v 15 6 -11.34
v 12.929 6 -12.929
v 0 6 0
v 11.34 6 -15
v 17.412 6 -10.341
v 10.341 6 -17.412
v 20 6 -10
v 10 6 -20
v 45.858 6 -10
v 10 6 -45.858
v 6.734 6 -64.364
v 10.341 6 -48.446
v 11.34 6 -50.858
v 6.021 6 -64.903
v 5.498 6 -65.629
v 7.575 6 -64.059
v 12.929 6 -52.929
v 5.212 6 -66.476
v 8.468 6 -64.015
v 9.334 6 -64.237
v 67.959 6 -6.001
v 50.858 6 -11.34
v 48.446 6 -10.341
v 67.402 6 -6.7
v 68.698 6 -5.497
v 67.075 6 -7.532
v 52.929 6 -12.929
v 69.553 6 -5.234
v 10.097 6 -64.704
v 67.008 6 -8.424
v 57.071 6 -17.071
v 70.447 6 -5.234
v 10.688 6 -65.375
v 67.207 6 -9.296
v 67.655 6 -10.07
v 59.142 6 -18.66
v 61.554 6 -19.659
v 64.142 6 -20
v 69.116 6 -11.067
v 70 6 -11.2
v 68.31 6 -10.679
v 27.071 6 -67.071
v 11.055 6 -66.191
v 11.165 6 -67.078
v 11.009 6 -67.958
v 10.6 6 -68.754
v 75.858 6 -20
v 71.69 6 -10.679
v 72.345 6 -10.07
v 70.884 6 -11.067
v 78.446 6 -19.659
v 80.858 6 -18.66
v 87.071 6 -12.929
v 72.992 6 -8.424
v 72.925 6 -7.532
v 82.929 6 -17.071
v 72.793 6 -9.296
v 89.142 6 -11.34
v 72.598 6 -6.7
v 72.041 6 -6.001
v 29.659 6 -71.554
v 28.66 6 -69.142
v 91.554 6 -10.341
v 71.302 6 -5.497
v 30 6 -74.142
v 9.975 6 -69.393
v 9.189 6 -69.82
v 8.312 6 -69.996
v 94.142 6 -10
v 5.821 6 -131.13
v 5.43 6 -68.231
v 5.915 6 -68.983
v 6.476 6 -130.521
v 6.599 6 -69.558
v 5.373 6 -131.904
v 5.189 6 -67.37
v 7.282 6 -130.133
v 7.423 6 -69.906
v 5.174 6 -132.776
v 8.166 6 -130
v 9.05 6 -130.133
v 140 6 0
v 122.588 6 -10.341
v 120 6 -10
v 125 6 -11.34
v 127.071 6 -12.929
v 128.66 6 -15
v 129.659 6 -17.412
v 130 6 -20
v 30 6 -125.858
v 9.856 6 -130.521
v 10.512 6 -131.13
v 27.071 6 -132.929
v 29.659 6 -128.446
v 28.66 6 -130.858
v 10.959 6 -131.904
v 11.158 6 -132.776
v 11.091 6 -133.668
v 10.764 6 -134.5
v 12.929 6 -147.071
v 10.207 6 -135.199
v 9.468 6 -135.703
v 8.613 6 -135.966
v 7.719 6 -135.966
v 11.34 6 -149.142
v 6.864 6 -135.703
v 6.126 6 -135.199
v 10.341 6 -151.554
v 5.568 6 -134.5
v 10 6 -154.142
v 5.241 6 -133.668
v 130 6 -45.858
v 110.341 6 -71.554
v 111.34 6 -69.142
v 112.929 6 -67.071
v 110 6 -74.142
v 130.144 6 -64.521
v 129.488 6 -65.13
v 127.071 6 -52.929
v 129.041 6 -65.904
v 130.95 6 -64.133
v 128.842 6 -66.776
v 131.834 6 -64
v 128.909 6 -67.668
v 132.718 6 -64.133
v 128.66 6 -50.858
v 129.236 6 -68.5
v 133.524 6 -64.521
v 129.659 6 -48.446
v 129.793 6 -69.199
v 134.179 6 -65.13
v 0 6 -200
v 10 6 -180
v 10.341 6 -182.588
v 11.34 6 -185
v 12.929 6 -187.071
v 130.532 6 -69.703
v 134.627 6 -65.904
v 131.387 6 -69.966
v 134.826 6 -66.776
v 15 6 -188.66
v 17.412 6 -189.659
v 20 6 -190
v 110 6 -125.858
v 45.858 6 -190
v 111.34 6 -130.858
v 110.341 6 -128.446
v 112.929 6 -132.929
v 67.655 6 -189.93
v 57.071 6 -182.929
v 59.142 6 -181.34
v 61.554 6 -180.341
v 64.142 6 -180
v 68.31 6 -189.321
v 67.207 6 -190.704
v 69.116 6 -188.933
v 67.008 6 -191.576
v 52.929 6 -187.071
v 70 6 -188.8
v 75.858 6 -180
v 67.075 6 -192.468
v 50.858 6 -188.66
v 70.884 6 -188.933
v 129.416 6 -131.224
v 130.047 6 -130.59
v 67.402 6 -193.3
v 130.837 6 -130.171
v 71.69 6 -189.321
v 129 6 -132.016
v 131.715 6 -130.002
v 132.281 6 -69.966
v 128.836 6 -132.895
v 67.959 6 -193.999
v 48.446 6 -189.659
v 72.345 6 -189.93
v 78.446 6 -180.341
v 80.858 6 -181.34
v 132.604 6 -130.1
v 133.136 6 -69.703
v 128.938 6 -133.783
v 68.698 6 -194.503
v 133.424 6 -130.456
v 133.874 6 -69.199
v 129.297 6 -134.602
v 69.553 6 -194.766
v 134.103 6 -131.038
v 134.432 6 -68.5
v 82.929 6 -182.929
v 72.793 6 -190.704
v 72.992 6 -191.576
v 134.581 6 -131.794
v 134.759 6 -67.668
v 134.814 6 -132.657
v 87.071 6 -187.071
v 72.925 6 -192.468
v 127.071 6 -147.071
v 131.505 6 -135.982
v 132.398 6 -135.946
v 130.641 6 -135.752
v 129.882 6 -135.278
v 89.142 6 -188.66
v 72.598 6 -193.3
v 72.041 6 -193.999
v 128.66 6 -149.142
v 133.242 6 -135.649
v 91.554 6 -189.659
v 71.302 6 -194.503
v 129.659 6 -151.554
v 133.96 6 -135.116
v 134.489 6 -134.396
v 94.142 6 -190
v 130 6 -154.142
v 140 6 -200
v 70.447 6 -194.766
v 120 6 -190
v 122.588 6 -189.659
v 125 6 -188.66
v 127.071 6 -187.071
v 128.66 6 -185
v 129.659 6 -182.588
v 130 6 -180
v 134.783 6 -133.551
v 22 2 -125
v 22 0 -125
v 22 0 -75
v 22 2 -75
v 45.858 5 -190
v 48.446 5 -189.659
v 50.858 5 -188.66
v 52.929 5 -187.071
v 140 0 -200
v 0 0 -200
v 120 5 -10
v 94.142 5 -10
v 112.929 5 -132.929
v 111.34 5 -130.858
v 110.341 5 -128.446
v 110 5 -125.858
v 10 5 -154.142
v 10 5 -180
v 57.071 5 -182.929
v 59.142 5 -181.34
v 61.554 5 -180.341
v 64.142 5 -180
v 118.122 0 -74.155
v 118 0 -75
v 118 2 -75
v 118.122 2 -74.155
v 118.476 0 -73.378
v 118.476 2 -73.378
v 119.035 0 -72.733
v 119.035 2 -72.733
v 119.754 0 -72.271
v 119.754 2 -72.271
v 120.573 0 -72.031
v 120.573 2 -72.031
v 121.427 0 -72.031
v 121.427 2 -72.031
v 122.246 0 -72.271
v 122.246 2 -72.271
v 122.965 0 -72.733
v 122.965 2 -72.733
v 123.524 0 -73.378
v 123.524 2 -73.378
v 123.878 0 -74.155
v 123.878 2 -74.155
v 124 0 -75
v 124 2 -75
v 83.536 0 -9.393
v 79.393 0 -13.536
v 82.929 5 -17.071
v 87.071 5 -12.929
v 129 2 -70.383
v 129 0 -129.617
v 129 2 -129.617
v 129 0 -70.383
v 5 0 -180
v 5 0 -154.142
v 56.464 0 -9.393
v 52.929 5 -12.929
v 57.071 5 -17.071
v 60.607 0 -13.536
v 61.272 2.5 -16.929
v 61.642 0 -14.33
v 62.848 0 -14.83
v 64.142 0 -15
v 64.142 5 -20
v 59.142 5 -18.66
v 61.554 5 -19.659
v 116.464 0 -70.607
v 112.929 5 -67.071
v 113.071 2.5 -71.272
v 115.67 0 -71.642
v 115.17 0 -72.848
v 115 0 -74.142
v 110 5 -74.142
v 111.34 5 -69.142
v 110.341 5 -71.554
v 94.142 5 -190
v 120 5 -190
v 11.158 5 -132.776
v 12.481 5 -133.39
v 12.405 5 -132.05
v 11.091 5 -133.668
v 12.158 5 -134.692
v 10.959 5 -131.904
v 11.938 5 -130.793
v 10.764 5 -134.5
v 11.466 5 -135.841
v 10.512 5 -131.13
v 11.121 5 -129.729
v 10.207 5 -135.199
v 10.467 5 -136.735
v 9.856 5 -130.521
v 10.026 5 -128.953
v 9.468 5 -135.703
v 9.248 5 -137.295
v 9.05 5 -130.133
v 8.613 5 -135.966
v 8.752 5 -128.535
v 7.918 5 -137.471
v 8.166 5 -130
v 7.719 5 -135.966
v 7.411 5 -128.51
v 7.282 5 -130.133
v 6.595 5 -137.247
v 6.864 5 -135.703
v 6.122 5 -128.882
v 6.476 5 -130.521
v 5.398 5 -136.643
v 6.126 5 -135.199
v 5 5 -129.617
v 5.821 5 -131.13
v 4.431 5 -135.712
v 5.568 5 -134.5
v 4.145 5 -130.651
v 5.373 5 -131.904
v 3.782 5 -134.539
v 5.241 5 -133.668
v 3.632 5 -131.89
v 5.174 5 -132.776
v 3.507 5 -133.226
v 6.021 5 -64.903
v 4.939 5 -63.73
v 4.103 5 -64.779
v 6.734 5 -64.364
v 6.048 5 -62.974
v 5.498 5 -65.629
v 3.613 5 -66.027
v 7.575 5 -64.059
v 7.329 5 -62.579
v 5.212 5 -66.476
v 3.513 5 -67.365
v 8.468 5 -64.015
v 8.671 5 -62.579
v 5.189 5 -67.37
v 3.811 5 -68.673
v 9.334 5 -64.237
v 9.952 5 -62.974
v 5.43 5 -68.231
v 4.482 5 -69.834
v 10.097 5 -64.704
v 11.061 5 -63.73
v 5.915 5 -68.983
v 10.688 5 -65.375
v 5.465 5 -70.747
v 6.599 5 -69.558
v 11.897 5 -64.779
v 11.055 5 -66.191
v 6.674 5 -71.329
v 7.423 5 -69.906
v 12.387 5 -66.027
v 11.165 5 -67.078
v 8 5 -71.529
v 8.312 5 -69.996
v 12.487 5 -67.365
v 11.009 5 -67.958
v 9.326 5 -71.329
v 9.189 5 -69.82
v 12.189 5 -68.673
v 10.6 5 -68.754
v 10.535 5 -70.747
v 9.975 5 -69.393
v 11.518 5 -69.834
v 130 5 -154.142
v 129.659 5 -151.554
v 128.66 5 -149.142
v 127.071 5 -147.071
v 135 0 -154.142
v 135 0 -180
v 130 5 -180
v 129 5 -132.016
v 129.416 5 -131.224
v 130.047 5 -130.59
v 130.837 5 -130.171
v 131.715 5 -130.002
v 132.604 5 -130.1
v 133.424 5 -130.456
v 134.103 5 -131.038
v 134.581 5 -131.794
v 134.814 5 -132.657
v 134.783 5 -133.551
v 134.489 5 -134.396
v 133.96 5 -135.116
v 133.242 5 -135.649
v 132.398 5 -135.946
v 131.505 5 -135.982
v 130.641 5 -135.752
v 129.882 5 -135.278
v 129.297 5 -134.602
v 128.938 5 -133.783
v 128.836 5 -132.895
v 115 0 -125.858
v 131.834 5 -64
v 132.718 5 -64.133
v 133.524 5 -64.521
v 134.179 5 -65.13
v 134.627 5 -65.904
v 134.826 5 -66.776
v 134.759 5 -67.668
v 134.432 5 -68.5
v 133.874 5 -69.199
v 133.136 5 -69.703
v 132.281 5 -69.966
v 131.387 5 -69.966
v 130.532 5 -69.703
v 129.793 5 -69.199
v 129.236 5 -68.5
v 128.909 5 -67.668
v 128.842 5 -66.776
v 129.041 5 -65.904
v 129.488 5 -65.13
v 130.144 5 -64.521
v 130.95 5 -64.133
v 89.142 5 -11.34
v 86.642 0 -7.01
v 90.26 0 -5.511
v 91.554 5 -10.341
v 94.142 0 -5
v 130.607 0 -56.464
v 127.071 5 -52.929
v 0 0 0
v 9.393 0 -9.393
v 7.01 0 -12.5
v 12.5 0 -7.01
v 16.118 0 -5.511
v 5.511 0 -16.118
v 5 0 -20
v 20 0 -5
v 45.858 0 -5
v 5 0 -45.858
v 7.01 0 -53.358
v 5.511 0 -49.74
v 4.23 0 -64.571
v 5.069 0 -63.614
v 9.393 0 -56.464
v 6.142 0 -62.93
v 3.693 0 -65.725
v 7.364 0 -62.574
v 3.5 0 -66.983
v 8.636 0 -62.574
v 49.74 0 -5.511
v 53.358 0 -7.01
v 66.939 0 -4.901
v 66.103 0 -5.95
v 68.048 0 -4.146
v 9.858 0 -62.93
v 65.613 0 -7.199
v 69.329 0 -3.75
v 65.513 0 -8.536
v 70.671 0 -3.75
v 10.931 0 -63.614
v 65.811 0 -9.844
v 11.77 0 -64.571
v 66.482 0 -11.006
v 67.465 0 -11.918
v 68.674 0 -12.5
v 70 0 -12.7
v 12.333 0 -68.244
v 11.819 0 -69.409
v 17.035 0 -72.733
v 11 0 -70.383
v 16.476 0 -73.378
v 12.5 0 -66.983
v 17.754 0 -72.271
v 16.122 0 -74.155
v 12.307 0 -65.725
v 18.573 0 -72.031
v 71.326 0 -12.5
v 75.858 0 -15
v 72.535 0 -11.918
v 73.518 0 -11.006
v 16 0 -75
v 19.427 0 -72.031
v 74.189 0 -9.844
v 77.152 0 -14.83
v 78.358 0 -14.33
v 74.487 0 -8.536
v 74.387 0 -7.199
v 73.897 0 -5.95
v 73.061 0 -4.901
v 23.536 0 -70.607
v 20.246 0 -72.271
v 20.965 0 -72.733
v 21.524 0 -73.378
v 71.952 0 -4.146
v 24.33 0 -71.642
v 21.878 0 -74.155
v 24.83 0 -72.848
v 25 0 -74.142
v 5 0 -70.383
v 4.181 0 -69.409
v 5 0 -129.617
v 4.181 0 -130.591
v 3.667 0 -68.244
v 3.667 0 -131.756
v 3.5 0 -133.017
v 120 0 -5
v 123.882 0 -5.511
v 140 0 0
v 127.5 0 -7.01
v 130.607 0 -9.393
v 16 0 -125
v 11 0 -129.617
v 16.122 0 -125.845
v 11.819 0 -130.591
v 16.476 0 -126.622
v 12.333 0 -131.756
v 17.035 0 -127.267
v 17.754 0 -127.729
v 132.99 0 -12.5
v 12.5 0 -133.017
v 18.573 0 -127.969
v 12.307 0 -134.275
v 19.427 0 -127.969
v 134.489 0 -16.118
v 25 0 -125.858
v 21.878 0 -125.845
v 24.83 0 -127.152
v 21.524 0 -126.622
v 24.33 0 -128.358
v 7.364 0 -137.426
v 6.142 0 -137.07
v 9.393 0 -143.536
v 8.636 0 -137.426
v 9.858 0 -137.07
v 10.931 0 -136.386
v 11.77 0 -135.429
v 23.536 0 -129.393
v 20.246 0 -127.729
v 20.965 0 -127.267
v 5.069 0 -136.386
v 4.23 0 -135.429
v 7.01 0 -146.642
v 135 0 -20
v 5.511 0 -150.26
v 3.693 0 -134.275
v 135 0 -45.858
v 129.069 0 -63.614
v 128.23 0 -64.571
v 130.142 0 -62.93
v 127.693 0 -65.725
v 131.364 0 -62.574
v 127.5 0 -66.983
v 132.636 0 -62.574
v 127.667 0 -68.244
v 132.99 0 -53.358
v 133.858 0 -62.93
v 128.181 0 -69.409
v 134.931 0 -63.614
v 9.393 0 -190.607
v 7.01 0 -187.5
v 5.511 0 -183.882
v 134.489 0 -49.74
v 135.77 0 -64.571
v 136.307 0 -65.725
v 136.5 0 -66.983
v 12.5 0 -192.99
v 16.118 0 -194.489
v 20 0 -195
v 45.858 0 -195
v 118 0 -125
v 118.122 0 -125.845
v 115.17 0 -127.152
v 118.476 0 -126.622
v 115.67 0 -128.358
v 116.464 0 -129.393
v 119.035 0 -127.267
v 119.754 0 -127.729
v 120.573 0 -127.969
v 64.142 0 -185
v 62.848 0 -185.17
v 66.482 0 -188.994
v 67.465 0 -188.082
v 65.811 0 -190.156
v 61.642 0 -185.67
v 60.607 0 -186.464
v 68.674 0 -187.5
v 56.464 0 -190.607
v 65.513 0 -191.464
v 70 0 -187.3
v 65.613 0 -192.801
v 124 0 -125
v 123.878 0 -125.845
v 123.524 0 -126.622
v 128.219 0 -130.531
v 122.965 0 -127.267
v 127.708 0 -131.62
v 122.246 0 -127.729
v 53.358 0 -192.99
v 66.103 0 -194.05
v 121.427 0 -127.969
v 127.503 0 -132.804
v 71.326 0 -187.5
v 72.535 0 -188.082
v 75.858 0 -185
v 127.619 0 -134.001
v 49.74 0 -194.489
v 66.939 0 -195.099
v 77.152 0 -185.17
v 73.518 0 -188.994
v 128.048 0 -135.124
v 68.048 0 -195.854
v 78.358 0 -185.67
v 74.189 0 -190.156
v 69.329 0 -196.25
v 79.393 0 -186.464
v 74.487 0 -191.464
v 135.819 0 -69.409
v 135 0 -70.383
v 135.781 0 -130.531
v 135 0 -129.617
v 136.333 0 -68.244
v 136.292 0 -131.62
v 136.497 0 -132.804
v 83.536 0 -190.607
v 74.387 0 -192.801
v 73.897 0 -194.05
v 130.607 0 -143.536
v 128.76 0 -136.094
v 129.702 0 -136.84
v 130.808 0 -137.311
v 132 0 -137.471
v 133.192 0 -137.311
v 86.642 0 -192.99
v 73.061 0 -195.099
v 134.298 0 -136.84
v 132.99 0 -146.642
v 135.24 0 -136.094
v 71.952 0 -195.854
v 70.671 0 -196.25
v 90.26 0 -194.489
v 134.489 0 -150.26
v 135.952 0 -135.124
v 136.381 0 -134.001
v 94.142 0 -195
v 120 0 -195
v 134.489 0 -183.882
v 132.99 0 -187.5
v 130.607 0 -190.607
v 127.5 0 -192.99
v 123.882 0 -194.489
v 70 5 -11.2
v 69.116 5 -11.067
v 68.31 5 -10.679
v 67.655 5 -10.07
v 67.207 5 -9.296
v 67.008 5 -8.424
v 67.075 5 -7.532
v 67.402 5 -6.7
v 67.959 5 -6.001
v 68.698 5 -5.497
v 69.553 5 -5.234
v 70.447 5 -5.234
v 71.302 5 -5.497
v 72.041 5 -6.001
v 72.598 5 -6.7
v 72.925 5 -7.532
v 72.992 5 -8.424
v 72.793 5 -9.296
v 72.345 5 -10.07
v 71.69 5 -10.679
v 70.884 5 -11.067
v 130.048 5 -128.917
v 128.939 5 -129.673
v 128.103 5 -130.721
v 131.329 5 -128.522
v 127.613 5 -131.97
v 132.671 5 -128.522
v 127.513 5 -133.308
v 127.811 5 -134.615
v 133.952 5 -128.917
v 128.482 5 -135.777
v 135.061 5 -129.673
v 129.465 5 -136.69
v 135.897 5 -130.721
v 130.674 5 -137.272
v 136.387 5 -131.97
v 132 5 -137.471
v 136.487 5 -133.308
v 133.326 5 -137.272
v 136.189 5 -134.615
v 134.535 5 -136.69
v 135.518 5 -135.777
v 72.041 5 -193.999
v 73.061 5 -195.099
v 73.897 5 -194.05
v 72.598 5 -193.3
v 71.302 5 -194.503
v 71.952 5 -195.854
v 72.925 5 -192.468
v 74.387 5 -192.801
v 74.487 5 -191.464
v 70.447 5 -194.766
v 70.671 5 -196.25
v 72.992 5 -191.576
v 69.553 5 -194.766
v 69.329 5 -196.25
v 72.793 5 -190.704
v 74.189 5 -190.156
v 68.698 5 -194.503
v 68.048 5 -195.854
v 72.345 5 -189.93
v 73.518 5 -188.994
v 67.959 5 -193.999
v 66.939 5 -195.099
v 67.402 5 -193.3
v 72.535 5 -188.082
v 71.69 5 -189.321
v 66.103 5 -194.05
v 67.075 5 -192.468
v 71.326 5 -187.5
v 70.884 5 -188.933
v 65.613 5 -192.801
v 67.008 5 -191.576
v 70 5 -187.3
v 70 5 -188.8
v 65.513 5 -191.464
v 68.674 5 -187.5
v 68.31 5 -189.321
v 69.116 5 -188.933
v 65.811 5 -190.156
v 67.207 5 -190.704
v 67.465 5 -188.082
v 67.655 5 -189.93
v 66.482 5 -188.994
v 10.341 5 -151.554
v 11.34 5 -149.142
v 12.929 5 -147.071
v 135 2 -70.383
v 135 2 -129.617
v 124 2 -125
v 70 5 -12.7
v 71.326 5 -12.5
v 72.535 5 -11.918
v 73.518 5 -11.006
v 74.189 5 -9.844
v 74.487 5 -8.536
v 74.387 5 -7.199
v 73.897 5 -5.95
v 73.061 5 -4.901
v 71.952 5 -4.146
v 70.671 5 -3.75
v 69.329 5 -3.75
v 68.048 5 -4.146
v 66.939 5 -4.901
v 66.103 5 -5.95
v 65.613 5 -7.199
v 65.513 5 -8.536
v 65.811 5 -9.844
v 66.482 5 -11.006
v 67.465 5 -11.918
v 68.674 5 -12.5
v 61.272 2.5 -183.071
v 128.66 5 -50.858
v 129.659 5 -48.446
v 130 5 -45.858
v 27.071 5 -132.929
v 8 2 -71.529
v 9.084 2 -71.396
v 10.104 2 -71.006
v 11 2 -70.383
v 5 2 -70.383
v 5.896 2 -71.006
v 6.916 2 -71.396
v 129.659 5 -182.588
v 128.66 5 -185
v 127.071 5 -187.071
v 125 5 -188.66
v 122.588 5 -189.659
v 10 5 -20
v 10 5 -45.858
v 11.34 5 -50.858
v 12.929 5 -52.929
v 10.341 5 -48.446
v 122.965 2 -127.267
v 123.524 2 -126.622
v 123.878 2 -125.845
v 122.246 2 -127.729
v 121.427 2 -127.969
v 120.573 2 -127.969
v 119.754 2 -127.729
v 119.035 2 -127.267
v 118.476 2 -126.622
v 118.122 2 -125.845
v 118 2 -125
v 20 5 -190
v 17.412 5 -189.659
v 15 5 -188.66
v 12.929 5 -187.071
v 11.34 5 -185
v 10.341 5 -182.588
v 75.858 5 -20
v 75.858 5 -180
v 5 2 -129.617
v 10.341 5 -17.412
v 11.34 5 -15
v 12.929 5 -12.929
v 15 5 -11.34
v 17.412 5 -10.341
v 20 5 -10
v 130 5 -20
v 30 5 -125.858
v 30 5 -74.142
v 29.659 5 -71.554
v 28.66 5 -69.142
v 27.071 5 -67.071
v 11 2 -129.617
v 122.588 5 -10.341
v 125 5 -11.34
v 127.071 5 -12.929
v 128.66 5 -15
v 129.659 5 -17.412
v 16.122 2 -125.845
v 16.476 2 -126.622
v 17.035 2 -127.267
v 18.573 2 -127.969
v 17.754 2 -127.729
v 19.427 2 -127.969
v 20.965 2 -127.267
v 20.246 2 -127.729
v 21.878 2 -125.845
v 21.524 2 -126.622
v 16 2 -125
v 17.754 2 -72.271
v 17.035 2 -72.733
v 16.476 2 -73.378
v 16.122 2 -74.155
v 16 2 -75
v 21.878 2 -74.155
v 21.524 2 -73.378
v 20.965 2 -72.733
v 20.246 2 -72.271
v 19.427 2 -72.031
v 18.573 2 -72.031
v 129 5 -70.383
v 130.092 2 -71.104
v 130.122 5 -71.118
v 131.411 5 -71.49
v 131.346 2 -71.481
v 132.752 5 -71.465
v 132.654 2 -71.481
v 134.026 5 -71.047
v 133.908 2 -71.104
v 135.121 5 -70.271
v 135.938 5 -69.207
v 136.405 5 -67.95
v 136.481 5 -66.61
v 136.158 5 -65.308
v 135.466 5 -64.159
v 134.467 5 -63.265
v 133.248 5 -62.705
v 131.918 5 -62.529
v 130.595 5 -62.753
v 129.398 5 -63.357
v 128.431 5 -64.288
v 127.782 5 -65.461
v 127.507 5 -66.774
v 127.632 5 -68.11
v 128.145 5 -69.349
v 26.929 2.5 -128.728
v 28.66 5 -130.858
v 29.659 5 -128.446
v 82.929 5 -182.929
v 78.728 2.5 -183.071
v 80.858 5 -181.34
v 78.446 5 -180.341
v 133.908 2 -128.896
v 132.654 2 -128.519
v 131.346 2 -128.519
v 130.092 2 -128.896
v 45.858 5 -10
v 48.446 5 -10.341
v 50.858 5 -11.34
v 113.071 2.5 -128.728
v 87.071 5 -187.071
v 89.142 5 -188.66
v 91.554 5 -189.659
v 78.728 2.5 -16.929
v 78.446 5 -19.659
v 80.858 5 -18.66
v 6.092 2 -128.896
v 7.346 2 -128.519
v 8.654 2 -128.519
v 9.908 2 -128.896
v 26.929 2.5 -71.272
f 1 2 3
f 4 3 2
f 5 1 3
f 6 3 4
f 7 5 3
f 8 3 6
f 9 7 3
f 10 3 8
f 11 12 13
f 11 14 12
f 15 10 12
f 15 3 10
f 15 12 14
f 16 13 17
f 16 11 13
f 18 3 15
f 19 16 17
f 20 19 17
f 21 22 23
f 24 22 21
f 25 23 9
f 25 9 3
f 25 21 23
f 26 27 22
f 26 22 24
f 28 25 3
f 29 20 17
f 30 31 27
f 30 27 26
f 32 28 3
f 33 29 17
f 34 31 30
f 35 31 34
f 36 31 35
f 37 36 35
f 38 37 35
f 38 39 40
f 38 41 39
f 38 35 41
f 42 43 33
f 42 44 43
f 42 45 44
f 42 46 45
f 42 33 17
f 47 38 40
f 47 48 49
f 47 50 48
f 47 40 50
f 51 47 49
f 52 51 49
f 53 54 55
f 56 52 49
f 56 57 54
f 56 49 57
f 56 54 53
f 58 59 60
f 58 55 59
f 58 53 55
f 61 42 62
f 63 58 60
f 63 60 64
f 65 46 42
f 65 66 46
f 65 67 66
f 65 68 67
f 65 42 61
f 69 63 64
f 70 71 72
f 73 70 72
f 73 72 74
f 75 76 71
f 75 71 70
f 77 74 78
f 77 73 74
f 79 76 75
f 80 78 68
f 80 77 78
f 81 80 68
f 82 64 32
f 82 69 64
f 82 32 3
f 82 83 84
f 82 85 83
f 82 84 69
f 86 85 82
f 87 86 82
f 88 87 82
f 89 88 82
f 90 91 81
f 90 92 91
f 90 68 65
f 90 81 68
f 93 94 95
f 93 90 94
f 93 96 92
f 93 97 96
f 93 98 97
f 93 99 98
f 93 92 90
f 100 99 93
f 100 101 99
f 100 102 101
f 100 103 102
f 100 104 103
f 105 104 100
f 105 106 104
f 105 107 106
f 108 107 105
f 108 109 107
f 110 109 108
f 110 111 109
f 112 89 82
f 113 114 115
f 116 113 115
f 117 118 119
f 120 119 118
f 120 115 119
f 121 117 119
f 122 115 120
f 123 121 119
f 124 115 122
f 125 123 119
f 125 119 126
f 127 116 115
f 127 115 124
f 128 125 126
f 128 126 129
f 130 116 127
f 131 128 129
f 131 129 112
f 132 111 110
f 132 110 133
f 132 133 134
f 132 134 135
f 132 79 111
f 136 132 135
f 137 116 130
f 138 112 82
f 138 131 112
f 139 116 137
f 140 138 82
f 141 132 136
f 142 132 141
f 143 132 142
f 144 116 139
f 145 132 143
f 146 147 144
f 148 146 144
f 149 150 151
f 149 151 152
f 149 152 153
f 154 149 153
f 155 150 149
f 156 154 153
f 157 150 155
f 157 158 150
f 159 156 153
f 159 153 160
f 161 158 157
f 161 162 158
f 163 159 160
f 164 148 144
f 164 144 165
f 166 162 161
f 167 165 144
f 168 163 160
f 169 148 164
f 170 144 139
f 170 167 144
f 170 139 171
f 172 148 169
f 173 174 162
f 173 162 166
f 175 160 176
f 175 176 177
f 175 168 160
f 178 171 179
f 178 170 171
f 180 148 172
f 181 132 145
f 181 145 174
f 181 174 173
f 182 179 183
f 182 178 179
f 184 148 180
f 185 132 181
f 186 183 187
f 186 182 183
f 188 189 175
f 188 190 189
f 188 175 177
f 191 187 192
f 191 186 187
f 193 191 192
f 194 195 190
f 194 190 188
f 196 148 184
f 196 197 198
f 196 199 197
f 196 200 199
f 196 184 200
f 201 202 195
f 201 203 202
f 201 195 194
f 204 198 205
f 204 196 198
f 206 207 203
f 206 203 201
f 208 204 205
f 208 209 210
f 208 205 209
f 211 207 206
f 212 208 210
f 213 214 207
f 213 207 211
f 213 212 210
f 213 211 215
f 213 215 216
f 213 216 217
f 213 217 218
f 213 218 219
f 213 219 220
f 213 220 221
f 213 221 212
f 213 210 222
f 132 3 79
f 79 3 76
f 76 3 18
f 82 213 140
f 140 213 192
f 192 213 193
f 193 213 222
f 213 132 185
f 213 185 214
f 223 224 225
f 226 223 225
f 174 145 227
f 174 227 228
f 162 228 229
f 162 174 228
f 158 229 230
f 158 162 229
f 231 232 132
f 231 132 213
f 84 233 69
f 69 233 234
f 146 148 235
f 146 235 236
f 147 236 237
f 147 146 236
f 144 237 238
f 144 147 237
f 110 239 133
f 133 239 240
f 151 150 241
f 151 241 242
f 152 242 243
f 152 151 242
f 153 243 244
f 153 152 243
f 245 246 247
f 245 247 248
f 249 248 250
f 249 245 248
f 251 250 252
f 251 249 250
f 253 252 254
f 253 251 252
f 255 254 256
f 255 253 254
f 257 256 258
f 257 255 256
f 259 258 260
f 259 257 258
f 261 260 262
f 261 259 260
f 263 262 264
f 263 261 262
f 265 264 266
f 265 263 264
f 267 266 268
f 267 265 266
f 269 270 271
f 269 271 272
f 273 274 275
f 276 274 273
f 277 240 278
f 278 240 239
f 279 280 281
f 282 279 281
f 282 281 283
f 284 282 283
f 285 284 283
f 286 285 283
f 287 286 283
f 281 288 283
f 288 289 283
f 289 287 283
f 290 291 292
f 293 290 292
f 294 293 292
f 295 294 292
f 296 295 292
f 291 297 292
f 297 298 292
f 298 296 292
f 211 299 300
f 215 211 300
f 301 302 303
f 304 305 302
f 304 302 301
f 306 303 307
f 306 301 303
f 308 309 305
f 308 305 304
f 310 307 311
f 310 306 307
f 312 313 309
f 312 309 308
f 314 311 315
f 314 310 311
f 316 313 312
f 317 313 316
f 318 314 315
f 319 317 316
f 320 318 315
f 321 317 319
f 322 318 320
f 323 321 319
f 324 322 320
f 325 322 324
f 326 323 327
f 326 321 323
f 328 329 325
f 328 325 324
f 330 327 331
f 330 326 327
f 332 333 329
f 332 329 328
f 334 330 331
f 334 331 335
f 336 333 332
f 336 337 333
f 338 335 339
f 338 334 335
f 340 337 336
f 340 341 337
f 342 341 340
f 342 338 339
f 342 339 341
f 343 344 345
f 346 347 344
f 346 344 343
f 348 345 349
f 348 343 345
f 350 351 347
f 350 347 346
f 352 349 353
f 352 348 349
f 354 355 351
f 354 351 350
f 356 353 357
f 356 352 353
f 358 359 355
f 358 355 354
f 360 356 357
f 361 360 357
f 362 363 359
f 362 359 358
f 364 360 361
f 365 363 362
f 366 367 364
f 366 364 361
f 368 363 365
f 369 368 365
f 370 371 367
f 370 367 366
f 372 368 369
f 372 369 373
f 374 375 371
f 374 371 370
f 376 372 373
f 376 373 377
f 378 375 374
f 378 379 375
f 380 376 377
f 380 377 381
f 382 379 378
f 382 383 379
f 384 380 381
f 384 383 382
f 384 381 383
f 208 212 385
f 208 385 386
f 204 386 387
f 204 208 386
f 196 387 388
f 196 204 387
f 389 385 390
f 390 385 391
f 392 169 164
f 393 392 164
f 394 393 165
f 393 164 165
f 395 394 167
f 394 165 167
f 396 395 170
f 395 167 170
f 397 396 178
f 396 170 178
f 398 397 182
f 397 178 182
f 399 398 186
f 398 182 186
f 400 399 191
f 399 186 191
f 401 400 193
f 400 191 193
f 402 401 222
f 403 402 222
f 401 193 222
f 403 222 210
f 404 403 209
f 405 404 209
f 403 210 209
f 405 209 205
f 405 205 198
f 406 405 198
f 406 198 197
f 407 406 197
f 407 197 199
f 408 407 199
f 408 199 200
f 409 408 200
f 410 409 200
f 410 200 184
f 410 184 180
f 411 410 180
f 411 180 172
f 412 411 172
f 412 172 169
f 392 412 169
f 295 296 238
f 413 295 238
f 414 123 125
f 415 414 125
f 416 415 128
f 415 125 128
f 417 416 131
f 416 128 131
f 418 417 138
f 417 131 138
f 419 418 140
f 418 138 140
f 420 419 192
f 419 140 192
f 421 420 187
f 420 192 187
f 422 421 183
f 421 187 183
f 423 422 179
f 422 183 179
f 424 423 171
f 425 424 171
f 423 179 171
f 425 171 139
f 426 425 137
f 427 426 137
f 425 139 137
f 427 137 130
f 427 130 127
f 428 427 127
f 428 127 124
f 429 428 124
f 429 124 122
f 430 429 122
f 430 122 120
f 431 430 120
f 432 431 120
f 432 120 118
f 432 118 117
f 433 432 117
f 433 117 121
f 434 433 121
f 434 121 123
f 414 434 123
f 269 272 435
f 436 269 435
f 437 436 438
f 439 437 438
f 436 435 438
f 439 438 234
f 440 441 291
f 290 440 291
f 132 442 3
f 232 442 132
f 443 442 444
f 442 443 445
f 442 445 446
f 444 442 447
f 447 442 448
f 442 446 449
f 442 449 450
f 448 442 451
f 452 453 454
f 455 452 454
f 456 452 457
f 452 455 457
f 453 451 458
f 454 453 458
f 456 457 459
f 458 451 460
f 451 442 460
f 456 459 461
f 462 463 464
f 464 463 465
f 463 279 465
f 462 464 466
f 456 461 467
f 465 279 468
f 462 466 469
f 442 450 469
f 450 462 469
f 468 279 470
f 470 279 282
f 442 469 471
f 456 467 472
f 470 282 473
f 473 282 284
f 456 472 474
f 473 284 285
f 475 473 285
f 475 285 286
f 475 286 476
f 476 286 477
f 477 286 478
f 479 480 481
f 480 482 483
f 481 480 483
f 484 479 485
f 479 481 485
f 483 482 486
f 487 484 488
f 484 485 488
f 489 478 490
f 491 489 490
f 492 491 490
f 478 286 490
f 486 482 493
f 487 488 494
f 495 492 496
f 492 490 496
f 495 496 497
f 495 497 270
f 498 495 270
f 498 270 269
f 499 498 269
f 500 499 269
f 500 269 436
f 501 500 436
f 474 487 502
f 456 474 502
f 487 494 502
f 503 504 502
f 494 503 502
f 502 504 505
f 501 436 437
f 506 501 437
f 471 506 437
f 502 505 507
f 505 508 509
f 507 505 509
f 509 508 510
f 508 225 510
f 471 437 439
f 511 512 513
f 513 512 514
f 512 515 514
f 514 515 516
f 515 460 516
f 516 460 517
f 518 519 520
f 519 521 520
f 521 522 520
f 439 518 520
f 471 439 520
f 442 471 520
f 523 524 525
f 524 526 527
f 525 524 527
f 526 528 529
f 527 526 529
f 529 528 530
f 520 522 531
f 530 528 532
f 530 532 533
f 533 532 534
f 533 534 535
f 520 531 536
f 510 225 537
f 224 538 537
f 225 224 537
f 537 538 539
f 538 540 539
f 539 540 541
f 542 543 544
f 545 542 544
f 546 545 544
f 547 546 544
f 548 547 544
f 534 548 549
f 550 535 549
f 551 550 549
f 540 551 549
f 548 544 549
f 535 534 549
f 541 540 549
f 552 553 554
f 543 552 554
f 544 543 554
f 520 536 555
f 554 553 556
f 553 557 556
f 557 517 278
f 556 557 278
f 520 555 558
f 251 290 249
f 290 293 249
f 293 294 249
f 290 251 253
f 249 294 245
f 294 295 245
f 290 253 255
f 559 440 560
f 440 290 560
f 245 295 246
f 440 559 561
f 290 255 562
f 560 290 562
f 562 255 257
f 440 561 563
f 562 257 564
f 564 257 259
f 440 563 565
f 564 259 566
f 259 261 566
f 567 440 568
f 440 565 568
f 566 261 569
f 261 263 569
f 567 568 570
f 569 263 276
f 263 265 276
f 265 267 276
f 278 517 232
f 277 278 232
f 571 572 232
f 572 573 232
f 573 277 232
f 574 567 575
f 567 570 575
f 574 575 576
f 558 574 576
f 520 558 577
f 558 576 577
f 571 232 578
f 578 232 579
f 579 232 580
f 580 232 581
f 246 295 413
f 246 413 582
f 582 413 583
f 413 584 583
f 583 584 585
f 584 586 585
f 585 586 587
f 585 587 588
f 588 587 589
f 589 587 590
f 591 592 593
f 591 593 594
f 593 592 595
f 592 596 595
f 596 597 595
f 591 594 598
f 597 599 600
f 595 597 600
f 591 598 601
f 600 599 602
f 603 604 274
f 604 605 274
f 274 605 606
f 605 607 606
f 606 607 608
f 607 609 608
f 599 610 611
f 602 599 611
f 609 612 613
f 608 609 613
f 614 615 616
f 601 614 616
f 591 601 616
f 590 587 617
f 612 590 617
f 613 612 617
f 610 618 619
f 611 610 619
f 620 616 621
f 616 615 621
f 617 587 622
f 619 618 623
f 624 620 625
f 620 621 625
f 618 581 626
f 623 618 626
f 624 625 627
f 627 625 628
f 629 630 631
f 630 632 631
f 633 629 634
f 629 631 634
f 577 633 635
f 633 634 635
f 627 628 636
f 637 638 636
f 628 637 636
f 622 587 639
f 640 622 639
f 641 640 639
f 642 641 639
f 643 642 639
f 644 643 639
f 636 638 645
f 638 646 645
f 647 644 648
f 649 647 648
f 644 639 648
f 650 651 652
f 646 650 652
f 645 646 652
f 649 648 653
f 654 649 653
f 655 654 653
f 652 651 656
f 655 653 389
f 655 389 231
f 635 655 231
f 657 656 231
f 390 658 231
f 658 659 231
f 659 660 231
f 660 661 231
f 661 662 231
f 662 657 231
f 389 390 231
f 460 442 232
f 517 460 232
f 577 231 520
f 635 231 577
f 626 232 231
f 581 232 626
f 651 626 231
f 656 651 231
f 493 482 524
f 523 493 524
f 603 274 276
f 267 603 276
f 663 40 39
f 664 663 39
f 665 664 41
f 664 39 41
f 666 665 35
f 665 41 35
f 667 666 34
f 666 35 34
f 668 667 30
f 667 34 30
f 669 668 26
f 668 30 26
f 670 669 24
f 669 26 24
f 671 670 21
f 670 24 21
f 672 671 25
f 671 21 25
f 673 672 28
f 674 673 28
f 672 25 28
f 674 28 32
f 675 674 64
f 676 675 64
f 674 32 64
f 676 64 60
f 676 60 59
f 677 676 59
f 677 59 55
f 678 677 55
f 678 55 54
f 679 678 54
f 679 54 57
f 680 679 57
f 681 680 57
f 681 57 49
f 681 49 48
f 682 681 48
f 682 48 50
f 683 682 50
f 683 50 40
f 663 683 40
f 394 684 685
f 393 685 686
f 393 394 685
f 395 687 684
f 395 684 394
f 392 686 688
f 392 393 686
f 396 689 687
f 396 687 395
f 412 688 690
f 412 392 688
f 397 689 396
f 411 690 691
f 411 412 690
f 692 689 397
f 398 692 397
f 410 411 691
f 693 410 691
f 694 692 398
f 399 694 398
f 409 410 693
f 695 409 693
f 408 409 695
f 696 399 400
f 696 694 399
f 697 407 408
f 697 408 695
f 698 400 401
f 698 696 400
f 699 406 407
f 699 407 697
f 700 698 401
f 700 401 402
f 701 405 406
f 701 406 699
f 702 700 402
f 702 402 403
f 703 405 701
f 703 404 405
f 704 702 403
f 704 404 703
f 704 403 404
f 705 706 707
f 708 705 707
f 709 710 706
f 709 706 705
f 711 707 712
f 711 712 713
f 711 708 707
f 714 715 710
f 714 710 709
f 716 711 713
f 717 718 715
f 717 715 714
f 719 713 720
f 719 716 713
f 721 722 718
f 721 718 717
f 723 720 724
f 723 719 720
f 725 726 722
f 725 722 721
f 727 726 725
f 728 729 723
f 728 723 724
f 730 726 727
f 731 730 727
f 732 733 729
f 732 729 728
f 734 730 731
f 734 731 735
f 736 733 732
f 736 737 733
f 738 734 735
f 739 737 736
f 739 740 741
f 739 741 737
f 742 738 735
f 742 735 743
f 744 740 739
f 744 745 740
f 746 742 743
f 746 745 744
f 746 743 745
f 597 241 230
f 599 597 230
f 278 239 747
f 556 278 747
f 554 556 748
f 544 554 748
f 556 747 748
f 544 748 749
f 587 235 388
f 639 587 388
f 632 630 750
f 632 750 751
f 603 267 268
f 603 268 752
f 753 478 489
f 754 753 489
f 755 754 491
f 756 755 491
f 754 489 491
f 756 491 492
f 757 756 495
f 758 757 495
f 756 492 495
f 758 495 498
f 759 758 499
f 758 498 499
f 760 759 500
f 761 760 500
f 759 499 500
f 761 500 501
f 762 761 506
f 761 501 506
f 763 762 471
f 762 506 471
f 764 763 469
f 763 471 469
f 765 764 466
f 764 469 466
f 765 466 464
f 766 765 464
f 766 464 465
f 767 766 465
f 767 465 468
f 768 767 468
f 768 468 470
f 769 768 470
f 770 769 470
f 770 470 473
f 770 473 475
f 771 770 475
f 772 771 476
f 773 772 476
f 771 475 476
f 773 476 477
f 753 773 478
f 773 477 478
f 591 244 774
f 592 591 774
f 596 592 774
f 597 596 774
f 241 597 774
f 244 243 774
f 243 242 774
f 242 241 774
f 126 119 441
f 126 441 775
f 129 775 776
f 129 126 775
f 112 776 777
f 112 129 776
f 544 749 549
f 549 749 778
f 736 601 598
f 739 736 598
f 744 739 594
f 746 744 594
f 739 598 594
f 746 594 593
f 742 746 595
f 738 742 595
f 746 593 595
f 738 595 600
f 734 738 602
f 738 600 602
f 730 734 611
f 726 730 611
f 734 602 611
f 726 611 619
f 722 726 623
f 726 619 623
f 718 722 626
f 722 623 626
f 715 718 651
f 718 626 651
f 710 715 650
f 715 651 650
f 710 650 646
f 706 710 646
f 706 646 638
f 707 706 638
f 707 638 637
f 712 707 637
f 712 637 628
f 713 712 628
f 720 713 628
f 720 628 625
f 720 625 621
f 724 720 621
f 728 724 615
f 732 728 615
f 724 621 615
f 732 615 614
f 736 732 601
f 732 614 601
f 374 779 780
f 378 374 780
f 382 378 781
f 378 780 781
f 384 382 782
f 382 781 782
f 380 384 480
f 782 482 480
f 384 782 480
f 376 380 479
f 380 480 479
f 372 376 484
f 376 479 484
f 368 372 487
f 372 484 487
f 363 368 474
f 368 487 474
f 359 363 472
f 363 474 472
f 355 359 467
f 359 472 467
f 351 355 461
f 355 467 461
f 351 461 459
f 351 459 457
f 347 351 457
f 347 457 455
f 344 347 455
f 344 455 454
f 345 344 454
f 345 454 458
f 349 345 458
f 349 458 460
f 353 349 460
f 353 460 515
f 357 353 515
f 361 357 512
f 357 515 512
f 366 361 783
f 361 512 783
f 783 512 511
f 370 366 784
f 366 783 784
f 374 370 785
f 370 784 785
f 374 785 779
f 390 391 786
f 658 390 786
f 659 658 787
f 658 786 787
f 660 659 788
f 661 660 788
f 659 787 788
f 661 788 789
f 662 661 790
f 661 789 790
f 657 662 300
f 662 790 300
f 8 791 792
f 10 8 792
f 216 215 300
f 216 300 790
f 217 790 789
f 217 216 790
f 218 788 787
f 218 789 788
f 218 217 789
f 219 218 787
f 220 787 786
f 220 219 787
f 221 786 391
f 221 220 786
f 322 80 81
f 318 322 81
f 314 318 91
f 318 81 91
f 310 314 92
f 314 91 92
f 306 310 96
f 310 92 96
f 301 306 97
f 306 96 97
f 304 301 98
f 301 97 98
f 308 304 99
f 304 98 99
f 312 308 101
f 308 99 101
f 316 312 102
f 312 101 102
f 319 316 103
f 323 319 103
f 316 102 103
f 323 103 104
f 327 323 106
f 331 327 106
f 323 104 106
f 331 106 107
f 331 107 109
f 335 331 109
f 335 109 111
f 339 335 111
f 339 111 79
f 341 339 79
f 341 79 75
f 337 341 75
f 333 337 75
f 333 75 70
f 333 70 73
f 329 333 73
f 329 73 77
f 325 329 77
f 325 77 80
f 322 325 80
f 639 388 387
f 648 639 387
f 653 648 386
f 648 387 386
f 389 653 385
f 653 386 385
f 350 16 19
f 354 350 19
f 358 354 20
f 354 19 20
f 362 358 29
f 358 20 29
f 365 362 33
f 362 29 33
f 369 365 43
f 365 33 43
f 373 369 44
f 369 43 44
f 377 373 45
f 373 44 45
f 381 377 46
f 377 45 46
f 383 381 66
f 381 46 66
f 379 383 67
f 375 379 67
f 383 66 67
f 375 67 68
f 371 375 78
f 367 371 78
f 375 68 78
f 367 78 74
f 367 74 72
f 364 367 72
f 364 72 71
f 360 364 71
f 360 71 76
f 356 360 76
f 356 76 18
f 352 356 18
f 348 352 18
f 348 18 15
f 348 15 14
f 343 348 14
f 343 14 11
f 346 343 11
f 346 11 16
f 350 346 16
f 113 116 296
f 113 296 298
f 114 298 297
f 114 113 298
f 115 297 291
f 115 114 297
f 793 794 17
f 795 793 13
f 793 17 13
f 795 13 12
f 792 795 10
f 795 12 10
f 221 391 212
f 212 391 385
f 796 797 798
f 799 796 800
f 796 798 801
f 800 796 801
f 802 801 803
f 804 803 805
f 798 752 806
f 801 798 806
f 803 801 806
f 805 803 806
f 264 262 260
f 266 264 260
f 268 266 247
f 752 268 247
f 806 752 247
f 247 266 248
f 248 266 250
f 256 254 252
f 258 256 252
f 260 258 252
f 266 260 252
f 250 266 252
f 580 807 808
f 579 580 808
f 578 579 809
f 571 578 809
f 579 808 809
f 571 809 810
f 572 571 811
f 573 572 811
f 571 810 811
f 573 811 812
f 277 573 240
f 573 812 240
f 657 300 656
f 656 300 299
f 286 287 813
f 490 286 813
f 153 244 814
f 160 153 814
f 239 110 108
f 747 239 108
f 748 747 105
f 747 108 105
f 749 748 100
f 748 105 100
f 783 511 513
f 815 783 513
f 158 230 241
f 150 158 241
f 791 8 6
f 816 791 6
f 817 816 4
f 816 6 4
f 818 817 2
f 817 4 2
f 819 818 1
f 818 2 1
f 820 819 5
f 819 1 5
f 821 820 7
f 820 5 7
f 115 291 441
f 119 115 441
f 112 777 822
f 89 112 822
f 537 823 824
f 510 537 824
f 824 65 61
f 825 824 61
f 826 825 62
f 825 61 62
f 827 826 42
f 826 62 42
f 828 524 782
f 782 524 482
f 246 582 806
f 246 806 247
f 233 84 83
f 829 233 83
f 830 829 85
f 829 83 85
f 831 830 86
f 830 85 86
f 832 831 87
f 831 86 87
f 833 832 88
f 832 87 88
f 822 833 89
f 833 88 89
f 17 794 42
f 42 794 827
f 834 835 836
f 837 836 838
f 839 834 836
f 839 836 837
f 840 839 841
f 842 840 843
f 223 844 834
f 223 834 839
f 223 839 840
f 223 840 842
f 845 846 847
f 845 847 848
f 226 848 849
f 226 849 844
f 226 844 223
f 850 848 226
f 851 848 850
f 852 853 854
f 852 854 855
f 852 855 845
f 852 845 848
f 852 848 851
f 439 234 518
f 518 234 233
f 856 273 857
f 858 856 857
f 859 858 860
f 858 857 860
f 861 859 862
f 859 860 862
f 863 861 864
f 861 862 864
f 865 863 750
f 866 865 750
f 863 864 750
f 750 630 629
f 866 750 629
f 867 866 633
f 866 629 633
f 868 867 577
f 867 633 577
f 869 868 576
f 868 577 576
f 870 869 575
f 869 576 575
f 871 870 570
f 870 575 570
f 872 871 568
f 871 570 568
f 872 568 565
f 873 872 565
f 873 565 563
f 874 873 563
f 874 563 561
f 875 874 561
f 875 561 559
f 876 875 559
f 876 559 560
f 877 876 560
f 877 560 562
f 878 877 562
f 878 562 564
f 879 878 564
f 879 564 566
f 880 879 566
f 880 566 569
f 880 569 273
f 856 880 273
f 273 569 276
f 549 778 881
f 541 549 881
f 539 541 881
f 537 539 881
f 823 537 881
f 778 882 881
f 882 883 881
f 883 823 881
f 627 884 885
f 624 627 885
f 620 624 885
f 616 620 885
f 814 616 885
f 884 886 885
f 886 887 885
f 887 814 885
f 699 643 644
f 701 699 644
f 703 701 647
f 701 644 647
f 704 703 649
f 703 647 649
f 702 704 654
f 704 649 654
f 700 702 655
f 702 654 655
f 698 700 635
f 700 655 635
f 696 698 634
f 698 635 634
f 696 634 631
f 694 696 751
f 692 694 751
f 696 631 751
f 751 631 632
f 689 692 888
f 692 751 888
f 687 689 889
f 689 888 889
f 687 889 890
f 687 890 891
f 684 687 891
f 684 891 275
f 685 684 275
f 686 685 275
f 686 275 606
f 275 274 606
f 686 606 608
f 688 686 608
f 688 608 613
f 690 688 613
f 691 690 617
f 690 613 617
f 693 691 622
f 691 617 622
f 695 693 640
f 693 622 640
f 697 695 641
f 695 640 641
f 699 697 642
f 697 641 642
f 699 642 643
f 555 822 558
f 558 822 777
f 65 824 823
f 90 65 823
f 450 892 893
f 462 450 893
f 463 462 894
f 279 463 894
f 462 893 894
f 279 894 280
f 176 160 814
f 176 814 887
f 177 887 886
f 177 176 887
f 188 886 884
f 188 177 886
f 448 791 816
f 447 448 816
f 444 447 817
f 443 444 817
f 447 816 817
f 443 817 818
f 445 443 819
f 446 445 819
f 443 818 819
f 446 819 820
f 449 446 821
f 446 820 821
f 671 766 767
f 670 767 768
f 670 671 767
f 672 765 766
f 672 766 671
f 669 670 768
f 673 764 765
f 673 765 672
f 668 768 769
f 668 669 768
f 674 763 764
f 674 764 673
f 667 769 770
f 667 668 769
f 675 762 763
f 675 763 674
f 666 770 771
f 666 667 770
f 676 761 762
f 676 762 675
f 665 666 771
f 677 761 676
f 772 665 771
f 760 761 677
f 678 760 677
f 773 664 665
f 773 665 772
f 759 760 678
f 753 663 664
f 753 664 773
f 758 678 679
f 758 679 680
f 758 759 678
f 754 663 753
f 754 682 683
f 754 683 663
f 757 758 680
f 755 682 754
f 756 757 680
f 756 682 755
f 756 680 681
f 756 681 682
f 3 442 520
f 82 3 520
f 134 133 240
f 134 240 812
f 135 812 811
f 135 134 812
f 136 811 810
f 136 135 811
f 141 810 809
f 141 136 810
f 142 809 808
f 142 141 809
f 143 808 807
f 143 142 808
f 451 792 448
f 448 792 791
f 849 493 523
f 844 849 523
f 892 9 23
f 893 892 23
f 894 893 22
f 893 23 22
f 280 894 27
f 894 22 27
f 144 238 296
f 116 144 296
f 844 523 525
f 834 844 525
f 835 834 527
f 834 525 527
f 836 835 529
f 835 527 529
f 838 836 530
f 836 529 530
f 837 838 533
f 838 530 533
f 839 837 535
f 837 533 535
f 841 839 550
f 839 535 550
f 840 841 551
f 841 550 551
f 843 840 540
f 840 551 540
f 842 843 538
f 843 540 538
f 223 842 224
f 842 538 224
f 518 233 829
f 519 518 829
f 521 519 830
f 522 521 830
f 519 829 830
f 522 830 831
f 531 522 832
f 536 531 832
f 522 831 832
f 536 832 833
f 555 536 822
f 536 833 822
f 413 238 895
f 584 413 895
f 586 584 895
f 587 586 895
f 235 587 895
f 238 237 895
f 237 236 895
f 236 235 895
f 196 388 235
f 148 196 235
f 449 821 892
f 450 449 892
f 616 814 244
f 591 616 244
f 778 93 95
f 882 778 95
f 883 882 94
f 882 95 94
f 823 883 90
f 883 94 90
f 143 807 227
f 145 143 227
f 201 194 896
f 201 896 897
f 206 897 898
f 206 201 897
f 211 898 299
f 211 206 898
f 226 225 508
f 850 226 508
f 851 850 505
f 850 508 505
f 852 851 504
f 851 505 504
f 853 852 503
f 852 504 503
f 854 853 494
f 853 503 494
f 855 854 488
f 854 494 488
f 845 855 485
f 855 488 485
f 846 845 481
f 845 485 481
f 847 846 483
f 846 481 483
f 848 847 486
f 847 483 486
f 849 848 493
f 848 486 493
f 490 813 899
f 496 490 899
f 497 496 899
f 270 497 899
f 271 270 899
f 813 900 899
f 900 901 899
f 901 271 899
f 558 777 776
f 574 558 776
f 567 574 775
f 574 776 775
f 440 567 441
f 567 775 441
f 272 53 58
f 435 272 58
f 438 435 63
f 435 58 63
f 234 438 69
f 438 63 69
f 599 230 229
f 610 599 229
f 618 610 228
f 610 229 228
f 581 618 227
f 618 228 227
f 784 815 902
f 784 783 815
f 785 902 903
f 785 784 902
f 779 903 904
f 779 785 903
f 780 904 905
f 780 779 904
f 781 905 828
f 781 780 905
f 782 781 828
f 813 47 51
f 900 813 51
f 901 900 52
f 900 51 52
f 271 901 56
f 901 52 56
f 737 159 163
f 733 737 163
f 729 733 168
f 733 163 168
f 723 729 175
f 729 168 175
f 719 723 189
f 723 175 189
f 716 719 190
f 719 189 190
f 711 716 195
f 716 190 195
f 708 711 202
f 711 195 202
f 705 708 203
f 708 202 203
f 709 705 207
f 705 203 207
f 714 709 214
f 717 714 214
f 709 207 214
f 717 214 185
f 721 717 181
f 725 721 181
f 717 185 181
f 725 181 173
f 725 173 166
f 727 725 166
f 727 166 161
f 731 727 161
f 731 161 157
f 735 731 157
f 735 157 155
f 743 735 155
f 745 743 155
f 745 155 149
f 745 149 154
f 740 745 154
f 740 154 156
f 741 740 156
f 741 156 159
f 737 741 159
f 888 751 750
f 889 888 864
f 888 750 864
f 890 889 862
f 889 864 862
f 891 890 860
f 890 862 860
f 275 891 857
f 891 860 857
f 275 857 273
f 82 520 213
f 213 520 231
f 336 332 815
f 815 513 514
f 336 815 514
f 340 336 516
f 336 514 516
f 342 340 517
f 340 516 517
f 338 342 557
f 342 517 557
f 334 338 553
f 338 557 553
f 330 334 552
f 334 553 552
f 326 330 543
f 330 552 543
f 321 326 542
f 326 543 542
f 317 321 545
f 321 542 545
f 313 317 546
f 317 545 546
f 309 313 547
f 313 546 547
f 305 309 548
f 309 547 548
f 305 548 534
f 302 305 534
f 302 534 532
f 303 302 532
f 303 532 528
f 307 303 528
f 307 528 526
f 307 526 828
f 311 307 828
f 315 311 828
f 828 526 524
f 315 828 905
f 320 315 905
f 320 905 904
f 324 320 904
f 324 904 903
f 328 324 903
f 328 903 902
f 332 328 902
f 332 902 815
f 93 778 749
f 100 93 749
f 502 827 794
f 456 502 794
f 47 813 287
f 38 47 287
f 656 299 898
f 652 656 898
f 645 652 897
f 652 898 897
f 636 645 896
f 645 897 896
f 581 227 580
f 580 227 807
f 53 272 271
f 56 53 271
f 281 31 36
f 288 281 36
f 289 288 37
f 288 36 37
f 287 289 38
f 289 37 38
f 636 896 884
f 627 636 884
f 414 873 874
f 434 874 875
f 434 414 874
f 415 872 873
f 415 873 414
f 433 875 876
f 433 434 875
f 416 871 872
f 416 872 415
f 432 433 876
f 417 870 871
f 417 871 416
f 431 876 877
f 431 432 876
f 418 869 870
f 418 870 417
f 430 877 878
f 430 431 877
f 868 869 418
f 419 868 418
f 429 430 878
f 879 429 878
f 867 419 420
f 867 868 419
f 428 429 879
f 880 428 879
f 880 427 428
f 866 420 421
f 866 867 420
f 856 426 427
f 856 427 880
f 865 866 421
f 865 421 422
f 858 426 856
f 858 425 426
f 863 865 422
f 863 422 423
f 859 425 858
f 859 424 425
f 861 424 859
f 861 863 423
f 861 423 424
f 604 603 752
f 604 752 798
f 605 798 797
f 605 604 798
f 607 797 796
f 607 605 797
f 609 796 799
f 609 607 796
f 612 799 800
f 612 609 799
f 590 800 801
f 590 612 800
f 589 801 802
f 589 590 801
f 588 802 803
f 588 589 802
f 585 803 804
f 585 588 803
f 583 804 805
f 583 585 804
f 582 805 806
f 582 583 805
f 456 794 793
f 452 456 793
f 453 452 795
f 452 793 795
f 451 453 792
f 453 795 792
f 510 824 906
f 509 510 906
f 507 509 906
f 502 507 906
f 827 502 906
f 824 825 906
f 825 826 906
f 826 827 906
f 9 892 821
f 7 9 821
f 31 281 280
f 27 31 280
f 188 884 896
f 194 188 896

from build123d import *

# Parameters (mm, degrees)
SKETCH1_W           = 140
SKETCH1_H           = 200
BOSS_EXTRUDE1_DEPTH = 6
FILLET1_R           = 10
FILLET2_R           = 10
CHAMFER4_SIZE       = 5
CUT_EXTRUDE1_DEPTH  = 2
SKETCH7_R           = 3
CUT_EXTRUDE3_DEPTH  = 10
SKETCH8_R           = 4.5
CUT_EXTRUDE4_DEPTH  = 5


with BuildPart() as part:
    # Sketch1 → Boss-Extrude1 (new body)
    with BuildSketch(Plane(origin=(0, 0, 0), x_dir=(1, 0, 0), z_dir=(0, 1, 0))):
        with Locations((70, 100)):
            Rectangle(SKETCH1_W, SKETCH1_H)
        Polygon((10, 190), (50, 190), (60, 180), (80, 180), (90, 190), (130, 190), (130, 150), (110, 130), (110, 70), (130, 50), (130, 10), (90, 10), (80, 20), (60, 20), (50, 10), (10, 10), (10, 50), (30, 70), (30, 130), (10, 150), align=None, mode=Mode.SUBTRACT)
    extrude(amount=BOSS_EXTRUDE1_DEPTH)

    # Fillet1
    fillet1_edges = [part.edges().sort_by_distance(p)[0] for p in [
        (10, 3, -190),
    ]]
    fillet(fillet1_edges, radius=FILLET1_R)

    # Fillet2
    fillet2_edges = [part.edges().sort_by_distance(p)[0] for p in [
        (10, 3, -150),
        (30, 3, -130),
        (30, 3, -70),
        (10, 3, -50),
        (10, 3, -10),
        (50, 3, -10),
        (60, 3, -20),
        (80, 3, -20),
        (90, 3, -10),
        (130, 3, -10),
        (130, 3, -50),
        (110, 3, -70),
        (110, 3, -130),
        (130, 3, -150),
        (130, 3, -190),
        (90, 3, -190),
        (80, 3, -180),
        (60, 3, -180),
        (50, 3, -190),
    ]]
    fillet(fillet2_edges, radius=FILLET2_R)

    # Chamfer4
    chamfer4_edges = [part.edges().sort_by_distance(p)[0] for p in [
        (79.6846987, 0, -19.238795325),
        (60.3153013, 0, -19.238795325),
        (29.238795325, 0, -70.3153013),
        (29.238795325, 0, -129.6846987),
        (10.761204675, 0, -150.3153013),
        (10.761204675, 0, -49.6846987),
        (12.928932188, 0, -12.928932188),
        (49.6846987, 0, -10.761204675),
        (90.3153013, 0, -10.761204675),
        (127.071067812, 0, -12.928932188),
        (129.238795325, 0, -49.6846987),
        (129.238795325, 0, -150.3153013),
        (127.071067812, 0, -187.071067812),
        (90.3153013, 0, -189.238795325),
        (49.6846987, 0, -189.238795325),
        (10, 0, -167.071067812),
        (12.928932188, 0, -187.071067812),
        (20, 0, -140),
        (32.928932188, 0, -190),
        (30, 0, -100),
        (20, 0, -60),
        (10, 0, -32.928932188),
        (32.928932188, 0, -10),
        (55, 0, -15),
        (70, 0, -20),
        (85, 0, -15),
        (107.071067812, 0, -10),
        (130, 0, -32.928932188),
        (120, 0, -60),
        (110, 0, -100),
        (120, 0, -140),
        (130, 0, -167.071067812),
        (107.071067812, 0, -190),
        (85, 0, -185),
        (70, 0, -180),
        (55, 0, -185),
        (60.3153013, 0, -180.761204675),
        (79.6846987, 0, -180.761204675),
        (110.761204675, 0, -129.6846987),
        (110.761204675, 0, -70.3153013),
    ]]
    chamfer(chamfer4_edges, length=CHAMFER4_SIZE)

    # Sketch6 → Cut-Extrude1 (cut)
    with BuildSketch(Plane.XZ):
        with BuildLine():
            Line((118, -125), (118, -75))
            ThreePointArc((118, -75), (121, -72), (124, -75))
            Line((124, -75), (124, -125))
            ThreePointArc((124, -125), (121, -128), (118, -125))
        make_face()
        with BuildLine():
            Line((129, -133.028561836), (129, -67.028561836))
            ThreePointArc((129, -67.028561836), (132, -64.028561836), (135, -67.028561836))
            Line((135, -67.028561836), (135, -133.028561836))
            ThreePointArc((135, -133.028561836), (132, -136.028561836), (129, -133.028561836))
        make_face()
        with BuildLine():
            Line((22, -125), (22, -75))
            ThreePointArc((22, -75), (19, -72), (16, -75))
            Line((16, -75), (16, -125))
            ThreePointArc((16, -125), (19, -128), (22, -125))
        make_face()
        with BuildLine():
            Line((11, -133.028561836), (11, -67.028561836))
            ThreePointArc((11, -67.028561836), (8, -64.028561836), (5, -67.028561836))
            Line((5, -67.028561836), (5, -133.028561836))
            ThreePointArc((5, -133.028561836), (8, -136.028561836), (11, -133.028561836))
        make_face()
    extrude(amount=-CUT_EXTRUDE1_DEPTH, mode=Mode.SUBTRACT)

    # Sketch7 → Cut-Extrude3 (cut)
    with BuildSketch(Plane(origin=(0, 6, 0), x_dir=(1, 0, 0), z_dir=(0, 1, 0))):
        with Locations(Location((70, 191.8, 0), (0, 0, 270))):
            Circle(SKETCH7_R)
        with Locations(Location((8.166074554, 133, 0), (0, 0, 270))):
            Circle(SKETCH7_R)
        with Locations(Location((70, 8.2, 0), (0, 0, 90))):
            Circle(SKETCH7_R)
        with Locations(Location((8.166074554, 67, 0), (0, 0, 258.632230209))):
            Circle(SKETCH7_R)
        with Locations(Location((131.833925446, 67, 0), (0, 0, 270))):
            Circle(SKETCH7_R)
        with Locations(Location((131.833925446, 133, 0), (0, 0, 199.153699919))):
            Circle(SKETCH7_R)
    extrude(amount=-CUT_EXTRUDE3_DEPTH, mode=Mode.SUBTRACT)

    # Sketch8 → Cut-Extrude4 (cut)
    with BuildSketch(Plane.XZ):
        with Locations(Location((70, -8.2, 0), (0, 0, 270))):
            Circle(SKETCH8_R)
        with Locations(Location((8, -67.028561836, 0), (0, 0, 270))):
            Circle(SKETCH8_R)
        with Locations(Location((132, -67.028561836, 0), (0, 0, 228.189685104))):
            Circle(SKETCH8_R)
        with Locations(Location((8, -132.971438164, 0), (0, 0, 131.810314896))):
            Circle(SKETCH8_R)
        with Locations(Location((70, -191.8, 0), (0, 0, 90))):
            Circle(SKETCH8_R)
        with Locations(Location((132, -132.971438164, 0), (0, 0, 270))):
            Circle(SKETCH8_R)
    extrude(amount=-CUT_EXTRUDE4_DEPTH, mode=Mode.SUBTRACT)


solid = part.part
